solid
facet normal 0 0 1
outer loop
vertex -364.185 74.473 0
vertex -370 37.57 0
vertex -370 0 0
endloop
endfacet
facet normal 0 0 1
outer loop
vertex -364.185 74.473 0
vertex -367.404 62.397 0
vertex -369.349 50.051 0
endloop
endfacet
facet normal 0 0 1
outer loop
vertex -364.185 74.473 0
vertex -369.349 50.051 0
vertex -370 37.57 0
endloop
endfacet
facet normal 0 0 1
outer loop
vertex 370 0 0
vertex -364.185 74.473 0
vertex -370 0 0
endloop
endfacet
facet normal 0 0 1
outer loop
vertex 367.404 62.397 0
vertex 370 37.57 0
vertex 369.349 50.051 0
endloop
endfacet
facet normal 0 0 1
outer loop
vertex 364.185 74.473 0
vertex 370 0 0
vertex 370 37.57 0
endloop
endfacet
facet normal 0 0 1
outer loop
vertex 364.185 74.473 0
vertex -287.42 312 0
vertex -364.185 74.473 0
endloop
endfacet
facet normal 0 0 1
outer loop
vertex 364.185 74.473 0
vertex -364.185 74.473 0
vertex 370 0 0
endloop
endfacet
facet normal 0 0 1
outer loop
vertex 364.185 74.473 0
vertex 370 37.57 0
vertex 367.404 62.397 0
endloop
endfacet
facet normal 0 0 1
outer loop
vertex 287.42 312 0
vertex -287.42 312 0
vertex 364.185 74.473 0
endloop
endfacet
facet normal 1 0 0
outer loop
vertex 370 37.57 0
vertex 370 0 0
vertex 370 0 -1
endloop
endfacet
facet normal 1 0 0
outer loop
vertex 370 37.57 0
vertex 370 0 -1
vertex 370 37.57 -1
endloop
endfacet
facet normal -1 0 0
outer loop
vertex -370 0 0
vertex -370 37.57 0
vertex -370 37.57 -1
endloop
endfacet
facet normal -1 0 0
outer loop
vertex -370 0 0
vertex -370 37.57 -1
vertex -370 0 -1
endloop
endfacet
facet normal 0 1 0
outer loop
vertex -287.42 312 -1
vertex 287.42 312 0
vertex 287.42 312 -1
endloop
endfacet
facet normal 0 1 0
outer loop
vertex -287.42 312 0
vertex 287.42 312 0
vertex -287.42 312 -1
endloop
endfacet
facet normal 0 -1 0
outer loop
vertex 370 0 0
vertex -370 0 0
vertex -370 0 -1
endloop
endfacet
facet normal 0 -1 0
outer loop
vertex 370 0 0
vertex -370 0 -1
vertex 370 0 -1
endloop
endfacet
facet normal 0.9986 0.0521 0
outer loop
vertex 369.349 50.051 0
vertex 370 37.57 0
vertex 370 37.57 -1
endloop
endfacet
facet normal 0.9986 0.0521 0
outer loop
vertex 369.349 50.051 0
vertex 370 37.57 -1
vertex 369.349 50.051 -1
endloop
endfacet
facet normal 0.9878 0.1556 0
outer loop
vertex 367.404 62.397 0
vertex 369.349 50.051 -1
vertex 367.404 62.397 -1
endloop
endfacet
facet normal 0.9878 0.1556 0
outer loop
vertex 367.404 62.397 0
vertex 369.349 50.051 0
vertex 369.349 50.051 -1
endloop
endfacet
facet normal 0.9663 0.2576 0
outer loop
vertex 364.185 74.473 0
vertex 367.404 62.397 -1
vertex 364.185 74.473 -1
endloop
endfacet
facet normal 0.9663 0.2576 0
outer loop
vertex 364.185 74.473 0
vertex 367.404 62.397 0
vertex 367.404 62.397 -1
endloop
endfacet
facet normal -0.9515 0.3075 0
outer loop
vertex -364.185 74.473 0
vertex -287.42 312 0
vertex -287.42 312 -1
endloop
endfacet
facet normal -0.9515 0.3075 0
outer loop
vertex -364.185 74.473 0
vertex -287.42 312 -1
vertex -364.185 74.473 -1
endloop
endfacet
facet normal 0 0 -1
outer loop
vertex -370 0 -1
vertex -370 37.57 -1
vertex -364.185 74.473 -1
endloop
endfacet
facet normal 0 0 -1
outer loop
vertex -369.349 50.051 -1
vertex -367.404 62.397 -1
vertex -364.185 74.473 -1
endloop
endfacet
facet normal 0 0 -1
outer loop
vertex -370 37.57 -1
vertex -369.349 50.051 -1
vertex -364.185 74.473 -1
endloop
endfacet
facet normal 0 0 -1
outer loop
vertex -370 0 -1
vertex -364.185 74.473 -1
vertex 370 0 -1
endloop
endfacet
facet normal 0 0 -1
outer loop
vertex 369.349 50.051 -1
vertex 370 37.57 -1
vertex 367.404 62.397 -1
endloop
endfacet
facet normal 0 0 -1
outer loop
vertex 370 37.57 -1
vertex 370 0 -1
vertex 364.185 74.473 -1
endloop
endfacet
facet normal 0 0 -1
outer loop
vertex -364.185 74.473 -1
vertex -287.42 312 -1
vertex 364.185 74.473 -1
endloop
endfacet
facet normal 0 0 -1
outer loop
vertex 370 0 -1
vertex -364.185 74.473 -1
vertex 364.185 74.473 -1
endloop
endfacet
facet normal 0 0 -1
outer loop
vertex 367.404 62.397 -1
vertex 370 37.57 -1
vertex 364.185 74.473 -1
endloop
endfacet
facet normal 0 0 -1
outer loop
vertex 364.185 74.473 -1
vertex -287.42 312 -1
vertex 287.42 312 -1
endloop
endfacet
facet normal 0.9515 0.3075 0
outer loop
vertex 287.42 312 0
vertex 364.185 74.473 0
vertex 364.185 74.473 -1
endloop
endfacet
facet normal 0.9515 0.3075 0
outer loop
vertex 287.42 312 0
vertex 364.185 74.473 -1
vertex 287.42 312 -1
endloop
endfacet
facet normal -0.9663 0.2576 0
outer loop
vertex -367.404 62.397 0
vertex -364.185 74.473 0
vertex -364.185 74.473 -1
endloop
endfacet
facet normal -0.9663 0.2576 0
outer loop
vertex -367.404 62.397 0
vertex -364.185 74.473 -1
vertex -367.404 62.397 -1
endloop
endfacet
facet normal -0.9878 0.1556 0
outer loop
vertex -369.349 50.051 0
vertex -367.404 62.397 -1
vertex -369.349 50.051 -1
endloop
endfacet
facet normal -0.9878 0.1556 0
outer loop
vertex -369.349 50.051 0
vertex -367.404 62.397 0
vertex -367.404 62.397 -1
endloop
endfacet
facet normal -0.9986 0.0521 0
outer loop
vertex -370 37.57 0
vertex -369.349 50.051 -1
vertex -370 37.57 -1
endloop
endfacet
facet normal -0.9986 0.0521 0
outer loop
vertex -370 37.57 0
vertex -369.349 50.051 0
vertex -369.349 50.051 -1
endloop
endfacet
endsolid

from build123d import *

# Parameters (mm, degrees)
TOP_FIREWALL_DEPTH = 1


# Sheet-metal steps are written as plain solids
with BuildPart() as part:
    # Sketch1 → Top Firewall (new body)
    with BuildSketch(Plane.XY):
        with BuildLine():
            Line((-370, 37.570353211), (-370, 0))
            Line((-370, 0), (370, 0))
            Line((370, 0), (370, 37.570353211))
            ThreePointArc((370, 37.570353211), (368.537307916, 56.249395802), (364.184889464, 74.473076931))
            Line((364.184889464, 74.473076931), (287.42, 312))
            Line((287.42, 312), (-287.42, 312))
            Line((-287.42, 312), (-364.184889464, 74.473076931))
            ThreePointArc((-364.184889464, 74.473076931), (-368.537307916, 56.249395802), (-370, 37.570353211))
        make_face()
    extrude(amount=-TOP_FIREWALL_DEPTH)


solid = part.part
